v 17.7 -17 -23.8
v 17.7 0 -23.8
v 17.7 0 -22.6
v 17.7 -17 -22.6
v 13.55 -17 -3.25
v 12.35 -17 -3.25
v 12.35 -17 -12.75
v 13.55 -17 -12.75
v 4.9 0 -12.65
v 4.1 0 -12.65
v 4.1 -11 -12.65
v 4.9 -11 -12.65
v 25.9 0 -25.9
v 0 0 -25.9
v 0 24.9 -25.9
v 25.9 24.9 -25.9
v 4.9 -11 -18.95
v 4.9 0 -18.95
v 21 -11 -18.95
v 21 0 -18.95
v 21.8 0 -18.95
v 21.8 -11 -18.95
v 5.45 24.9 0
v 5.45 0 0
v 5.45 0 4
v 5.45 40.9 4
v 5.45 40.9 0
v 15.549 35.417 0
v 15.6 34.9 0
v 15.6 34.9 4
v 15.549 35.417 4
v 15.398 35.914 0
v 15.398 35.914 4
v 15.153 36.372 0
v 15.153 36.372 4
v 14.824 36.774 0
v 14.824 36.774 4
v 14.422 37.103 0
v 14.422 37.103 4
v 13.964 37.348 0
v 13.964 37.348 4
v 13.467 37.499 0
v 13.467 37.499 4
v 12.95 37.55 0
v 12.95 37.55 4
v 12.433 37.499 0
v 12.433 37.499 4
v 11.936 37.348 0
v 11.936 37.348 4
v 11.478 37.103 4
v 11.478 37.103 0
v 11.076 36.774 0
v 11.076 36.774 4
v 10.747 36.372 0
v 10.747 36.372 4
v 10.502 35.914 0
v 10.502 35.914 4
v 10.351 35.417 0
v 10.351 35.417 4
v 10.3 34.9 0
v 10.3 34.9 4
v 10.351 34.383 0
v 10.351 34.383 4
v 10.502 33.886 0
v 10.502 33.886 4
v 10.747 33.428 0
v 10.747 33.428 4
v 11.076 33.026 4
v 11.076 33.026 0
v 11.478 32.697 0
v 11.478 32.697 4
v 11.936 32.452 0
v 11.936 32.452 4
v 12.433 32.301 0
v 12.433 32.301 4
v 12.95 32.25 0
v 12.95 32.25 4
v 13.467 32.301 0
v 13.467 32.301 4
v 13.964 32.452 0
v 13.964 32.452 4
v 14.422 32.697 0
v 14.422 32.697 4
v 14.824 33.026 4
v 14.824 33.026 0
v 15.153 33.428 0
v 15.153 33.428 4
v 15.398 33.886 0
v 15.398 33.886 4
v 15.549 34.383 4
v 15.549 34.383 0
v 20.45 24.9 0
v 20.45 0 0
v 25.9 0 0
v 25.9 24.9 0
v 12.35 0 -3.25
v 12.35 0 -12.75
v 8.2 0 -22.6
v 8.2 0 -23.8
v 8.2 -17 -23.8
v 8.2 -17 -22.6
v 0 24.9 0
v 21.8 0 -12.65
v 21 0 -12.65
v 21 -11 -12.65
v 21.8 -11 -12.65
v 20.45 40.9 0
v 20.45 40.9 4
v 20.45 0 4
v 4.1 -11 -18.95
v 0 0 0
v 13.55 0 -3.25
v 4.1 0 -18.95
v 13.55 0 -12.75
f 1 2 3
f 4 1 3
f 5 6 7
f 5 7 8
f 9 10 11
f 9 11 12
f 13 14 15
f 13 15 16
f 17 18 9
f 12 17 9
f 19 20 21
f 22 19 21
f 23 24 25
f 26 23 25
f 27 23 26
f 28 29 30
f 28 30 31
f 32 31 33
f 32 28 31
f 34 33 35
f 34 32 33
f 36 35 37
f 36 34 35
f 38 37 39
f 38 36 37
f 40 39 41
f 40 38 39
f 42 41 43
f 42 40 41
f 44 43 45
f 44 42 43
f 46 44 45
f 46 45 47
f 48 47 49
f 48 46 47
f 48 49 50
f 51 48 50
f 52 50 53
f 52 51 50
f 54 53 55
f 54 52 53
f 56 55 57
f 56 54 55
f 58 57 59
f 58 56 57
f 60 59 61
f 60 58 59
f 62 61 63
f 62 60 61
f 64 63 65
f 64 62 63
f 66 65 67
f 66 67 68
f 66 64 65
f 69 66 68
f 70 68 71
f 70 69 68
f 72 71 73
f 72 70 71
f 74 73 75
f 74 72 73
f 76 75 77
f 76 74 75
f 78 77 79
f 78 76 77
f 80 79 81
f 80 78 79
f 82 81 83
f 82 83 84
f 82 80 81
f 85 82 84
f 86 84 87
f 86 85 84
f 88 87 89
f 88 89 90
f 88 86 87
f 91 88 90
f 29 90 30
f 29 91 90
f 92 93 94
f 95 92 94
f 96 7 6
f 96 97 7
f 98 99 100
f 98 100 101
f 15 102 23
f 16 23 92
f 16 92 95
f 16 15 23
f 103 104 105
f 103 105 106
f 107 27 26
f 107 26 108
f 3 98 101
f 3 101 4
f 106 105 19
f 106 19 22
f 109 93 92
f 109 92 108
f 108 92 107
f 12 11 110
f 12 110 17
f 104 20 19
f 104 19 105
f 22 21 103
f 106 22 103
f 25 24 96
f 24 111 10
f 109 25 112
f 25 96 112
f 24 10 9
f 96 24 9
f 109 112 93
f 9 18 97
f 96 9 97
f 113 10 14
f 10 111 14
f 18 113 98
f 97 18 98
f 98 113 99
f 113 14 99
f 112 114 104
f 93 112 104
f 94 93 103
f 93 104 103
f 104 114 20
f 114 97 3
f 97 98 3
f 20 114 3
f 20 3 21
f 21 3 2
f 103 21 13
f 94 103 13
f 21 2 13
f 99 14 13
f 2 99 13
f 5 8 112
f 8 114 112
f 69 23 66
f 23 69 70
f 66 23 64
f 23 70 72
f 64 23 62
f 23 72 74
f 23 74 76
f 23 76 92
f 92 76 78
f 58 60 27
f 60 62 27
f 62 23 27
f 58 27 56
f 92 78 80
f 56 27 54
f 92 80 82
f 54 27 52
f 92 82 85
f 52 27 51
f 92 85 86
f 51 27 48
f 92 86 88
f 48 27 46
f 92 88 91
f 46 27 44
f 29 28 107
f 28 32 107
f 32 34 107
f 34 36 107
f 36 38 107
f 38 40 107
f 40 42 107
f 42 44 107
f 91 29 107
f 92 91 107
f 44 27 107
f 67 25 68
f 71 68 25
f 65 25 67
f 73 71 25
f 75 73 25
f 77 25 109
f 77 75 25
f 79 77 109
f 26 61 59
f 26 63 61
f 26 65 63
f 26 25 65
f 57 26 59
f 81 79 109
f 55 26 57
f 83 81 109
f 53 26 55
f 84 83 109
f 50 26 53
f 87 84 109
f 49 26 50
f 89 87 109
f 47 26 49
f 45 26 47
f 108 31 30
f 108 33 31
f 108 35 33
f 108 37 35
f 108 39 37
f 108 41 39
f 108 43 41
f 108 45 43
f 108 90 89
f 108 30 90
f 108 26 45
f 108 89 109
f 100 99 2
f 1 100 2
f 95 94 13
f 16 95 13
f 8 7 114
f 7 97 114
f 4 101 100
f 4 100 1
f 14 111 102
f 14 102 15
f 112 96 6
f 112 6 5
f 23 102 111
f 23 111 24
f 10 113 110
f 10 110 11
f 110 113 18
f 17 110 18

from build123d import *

# Parameters (mm, degrees)
SKETCH1_W           = 25.9
SKETCH1_H           = 25.9
BOSS_EXTRUDE1_DEPTH = 24.9
SKETCH2_W           = 15
SKETCH2_H           = 40.9
SKETCH2_R           = 2.65
BOSS_EXTRUDE2_DEPTH = 4
SKETCH3_W           = 9.5
SKETCH3_H           = 1.2
SKETCH3_W_2         = 0.8
SKETCH3_H_2         = 6.3
SKETCH3_W_3         = 1.2
SKETCH3_H_3         = 9.5
BOSS_EXTRUDE3_DEPTH = 11
SKETCH5_W           = 1.2
SKETCH5_H           = 9.5
SKETCH5_W_2         = 9.5
SKETCH5_H_2         = 1.2
BOSS_EXTRUDE4_DEPTH = 6


with BuildPart() as part:
    # Sketch1 → Boss-Extrude1 (new body)
    with BuildSketch(Plane(origin=(0, 0, 0), x_dir=(1, 0, 0), z_dir=(0, 1, 0))):
        with Locations((12.95, 12.95)):
            Rectangle(SKETCH1_W, SKETCH1_H)
    extrude(amount=BOSS_EXTRUDE1_DEPTH)

    # Sketch2 → Boss-Extrude2 (add)
    with BuildSketch(Plane.XY):
        with Locations((12.95, 20.45)):
            Rectangle(SKETCH2_W, SKETCH2_H)
        with Locations((12.95, 34.9)):
            Circle(SKETCH2_R, mode=Mode.SUBTRACT)
    extrude(amount=BOSS_EXTRUDE2_DEPTH)

    # Sketch3 → Boss-Extrude3 (add)
    with BuildSketch(Plane.XZ):
        with Locations((12.95, -23.2)):
            Rectangle(SKETCH3_W, SKETCH3_H)
        with Locations((21.4, -15.8)):
            Rectangle(SKETCH3_W_2, SKETCH3_H_2)
        with Locations((4.5, -15.8)):
            Rectangle(SKETCH3_W_2, SKETCH3_H_2)
        with Locations((12.95, -8)):
            Rectangle(SKETCH3_W_3, SKETCH3_H_3)
    extrude(amount=BOSS_EXTRUDE3_DEPTH)

    # Sketch5 → Boss-Extrude4 (add)
    with BuildSketch(Plane.XZ.offset(11)):
        with Locations((12.95, -8)):
            Rectangle(SKETCH5_W, SKETCH5_H)
        with Locations((12.95, -23.2)):
            Rectangle(SKETCH5_W_2, SKETCH5_H_2)
    extrude(amount=BOSS_EXTRUDE4_DEPTH)


solid = part.part
